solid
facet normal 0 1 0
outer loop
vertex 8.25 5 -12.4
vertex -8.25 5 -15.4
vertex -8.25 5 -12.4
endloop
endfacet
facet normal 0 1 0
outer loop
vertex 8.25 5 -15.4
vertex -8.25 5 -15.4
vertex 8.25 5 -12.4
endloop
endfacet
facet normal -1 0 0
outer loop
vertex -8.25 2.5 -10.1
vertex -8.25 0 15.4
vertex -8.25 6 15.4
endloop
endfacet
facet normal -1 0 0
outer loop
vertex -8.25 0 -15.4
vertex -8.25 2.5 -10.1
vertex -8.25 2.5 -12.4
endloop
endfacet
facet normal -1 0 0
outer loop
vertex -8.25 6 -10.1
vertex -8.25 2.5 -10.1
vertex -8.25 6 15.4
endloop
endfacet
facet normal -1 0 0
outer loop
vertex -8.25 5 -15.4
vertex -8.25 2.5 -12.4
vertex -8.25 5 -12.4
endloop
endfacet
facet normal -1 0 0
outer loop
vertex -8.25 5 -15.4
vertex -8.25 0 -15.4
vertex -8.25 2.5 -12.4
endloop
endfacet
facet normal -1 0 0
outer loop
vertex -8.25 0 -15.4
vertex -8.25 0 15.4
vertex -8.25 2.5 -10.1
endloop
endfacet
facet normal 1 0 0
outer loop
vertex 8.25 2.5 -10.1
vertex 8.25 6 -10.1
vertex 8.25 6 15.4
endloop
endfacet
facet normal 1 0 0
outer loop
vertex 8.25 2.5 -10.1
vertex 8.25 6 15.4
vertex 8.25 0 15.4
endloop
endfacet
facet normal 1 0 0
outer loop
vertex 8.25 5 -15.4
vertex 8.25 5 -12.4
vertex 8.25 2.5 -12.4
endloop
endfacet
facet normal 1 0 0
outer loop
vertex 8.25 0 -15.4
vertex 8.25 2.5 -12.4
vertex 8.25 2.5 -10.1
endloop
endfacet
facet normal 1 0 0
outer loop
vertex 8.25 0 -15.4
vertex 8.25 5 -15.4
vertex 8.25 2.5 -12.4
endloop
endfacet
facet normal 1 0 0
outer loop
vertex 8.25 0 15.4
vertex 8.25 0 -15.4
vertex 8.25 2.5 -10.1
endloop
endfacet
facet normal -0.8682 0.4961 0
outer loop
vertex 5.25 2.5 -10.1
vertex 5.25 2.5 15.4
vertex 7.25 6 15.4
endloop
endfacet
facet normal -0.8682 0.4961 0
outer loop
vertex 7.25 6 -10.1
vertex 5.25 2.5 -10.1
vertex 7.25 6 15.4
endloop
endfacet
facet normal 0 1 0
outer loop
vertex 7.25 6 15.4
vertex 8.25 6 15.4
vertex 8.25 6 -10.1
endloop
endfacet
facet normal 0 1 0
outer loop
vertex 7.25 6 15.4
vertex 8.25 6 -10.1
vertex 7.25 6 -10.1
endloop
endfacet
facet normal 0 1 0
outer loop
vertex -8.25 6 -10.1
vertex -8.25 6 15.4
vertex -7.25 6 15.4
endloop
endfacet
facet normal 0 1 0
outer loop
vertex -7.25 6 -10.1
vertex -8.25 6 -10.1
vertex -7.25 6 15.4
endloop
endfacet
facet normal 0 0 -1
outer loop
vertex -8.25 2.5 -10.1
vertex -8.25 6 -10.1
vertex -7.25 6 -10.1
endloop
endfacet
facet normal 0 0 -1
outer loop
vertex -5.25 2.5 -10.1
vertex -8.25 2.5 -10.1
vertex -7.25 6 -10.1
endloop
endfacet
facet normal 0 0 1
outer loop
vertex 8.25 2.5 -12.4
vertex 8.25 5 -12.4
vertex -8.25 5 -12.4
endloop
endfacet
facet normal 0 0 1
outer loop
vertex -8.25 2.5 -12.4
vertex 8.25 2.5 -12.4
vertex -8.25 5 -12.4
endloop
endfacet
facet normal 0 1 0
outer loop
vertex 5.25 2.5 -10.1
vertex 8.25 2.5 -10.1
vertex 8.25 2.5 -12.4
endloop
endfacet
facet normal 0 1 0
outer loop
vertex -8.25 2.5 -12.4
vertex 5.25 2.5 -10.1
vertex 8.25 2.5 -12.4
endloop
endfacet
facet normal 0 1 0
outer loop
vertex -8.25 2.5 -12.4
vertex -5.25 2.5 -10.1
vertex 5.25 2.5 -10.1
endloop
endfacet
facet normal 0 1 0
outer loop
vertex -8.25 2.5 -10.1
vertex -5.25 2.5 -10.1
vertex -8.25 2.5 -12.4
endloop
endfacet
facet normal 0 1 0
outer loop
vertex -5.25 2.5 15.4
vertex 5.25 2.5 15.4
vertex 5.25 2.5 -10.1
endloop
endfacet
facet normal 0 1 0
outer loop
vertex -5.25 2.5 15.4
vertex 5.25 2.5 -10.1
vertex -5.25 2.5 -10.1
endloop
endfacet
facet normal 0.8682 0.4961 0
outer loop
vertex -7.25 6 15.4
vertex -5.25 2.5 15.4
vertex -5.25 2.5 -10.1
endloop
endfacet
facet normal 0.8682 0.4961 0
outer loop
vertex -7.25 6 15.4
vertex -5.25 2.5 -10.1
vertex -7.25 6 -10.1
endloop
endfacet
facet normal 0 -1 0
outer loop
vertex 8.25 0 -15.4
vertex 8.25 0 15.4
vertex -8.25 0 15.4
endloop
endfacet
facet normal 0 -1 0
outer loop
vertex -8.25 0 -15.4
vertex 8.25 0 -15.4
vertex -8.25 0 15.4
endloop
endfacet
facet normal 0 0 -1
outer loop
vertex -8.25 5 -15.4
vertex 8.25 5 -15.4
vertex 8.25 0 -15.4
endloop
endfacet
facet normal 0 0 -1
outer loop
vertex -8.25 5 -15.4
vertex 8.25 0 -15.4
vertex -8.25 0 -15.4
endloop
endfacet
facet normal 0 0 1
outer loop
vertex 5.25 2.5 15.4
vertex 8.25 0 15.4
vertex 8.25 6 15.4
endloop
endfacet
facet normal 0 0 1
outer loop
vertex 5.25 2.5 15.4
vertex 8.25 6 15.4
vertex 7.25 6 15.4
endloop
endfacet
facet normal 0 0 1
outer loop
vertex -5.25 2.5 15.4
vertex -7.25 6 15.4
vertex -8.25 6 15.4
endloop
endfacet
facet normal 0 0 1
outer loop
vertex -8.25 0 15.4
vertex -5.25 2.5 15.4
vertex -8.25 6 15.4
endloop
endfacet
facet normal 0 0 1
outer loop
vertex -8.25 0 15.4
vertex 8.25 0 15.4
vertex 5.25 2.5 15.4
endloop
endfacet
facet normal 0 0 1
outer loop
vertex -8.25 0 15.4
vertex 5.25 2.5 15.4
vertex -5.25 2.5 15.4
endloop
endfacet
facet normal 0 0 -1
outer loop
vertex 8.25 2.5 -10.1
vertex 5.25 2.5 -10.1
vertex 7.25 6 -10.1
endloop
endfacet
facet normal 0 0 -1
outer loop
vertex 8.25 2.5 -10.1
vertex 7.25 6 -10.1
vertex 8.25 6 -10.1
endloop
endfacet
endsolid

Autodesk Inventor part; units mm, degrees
ref_plane "YZ Plane" through (0, 0, 0) normal (1, 0, 0) x (0, 1, 0)
ref_plane "XZ Plane" through (0, 0, 0) normal (0, 1, 0) x (-1, 0, 0)
ref_plane "XY Plane" through (0, 0, 0) normal (0, 0, 1) x (1, 0, 0)
sketch "Эскиз1" plane through (0, 0, 0) normal (0, 1, 0) x (-1, 0, 0)
  line L0 (-8.25, 15.4) -> (8.25, 15.4)
  line L1 (8.25, 15.4) -> (8.25, -15.4)
  line L2 (8.25, -15.4) -> (-8.25, -15.4)
  line L3 (-8.25, -15.4) -> (-8.25, 15.4)
  line L4 (-8.25, 15.4) -> (8.25, -15.4) construction
  line L5 (8.25, 15.4) -> (-8.25, -15.4) construction
  point P0 (0, 0)
  dimension "d0" = 30.8
  dimension "d1" = 16.5
extrude "Выдавливание1" add sketch "Эскиз1" along normal blind 2.5
sketch "Эскиз2" plane through (-8.25, 0, 15.4) normal (0, 0, 1) x (1, 0, 0)
  line L0 (0, 0) -> (16.5, 0) construction
  line L1 (16.5, 0) -> (16.5, 2.5) construction
  line L2 (0, 2.5) -> (16.5, 2.5) construction
  line L3 (0, 0) -> (0, 2.5) construction
  line L4 (0, 2.5) -> (0, 6)
  line L5 (0, 6) -> (1, 6)
  line L6 (0, 2.5) -> (3, 2.5)
  line L7 (0, 2.5) -> (16.5, 2.5) construction
  line L8 (3, 2.5) -> (1, 6)
  line L9 (8.25, 0) -> (8.25, 2.5) construction
  line L10 (16.5, 2.5) -> (16.5, 6)
  line L11 (16.5, 6) -> (15.5, 6)
  line L12 (16.5, 2.5) -> (13.5, 2.5)
  line L13 (13.5, 2.5) -> (15.5, 6)
  dimension "d4" = 3.5
  dimension "d5" = 1
  dimension "d6" = 3
extrude "Выдавливание2" add sketch "Эскиз2" against normal blind 25.5
sketch "Эскиз3" plane through (8.25, 0, -15.4) normal (0, 0, -1) x (-1, 0, 0)
  line L0 (0, 0) -> (16.5, 0) construction
  line L1 (16.5, 0) -> (16.5, 2.5) construction
  line L2 (0, 2.5) -> (16.5, 2.5) projected
  line L3 (0, 0) -> (0, 2.5) construction
  line L4 (3, 2.5) -> (0, 2.5) projected
  line L5 (16.5, 0) -> (16.5, 6) construction
  line L6 (0, 2.5) -> (16.5, 2.5)
  line L7 (16.5, 2.5) -> (16.5, 5)
  line L8 (16.5, 5) -> (0, 5)
  line L9 (0, 5) -> (0, 2.5)
  point P0 (8.25, 0)
  dimension "d9" = 2.5
extrude "Выдавливание3" add sketch "Эскиз3" against normal blind 3
properties part number "kicker_cover001"
